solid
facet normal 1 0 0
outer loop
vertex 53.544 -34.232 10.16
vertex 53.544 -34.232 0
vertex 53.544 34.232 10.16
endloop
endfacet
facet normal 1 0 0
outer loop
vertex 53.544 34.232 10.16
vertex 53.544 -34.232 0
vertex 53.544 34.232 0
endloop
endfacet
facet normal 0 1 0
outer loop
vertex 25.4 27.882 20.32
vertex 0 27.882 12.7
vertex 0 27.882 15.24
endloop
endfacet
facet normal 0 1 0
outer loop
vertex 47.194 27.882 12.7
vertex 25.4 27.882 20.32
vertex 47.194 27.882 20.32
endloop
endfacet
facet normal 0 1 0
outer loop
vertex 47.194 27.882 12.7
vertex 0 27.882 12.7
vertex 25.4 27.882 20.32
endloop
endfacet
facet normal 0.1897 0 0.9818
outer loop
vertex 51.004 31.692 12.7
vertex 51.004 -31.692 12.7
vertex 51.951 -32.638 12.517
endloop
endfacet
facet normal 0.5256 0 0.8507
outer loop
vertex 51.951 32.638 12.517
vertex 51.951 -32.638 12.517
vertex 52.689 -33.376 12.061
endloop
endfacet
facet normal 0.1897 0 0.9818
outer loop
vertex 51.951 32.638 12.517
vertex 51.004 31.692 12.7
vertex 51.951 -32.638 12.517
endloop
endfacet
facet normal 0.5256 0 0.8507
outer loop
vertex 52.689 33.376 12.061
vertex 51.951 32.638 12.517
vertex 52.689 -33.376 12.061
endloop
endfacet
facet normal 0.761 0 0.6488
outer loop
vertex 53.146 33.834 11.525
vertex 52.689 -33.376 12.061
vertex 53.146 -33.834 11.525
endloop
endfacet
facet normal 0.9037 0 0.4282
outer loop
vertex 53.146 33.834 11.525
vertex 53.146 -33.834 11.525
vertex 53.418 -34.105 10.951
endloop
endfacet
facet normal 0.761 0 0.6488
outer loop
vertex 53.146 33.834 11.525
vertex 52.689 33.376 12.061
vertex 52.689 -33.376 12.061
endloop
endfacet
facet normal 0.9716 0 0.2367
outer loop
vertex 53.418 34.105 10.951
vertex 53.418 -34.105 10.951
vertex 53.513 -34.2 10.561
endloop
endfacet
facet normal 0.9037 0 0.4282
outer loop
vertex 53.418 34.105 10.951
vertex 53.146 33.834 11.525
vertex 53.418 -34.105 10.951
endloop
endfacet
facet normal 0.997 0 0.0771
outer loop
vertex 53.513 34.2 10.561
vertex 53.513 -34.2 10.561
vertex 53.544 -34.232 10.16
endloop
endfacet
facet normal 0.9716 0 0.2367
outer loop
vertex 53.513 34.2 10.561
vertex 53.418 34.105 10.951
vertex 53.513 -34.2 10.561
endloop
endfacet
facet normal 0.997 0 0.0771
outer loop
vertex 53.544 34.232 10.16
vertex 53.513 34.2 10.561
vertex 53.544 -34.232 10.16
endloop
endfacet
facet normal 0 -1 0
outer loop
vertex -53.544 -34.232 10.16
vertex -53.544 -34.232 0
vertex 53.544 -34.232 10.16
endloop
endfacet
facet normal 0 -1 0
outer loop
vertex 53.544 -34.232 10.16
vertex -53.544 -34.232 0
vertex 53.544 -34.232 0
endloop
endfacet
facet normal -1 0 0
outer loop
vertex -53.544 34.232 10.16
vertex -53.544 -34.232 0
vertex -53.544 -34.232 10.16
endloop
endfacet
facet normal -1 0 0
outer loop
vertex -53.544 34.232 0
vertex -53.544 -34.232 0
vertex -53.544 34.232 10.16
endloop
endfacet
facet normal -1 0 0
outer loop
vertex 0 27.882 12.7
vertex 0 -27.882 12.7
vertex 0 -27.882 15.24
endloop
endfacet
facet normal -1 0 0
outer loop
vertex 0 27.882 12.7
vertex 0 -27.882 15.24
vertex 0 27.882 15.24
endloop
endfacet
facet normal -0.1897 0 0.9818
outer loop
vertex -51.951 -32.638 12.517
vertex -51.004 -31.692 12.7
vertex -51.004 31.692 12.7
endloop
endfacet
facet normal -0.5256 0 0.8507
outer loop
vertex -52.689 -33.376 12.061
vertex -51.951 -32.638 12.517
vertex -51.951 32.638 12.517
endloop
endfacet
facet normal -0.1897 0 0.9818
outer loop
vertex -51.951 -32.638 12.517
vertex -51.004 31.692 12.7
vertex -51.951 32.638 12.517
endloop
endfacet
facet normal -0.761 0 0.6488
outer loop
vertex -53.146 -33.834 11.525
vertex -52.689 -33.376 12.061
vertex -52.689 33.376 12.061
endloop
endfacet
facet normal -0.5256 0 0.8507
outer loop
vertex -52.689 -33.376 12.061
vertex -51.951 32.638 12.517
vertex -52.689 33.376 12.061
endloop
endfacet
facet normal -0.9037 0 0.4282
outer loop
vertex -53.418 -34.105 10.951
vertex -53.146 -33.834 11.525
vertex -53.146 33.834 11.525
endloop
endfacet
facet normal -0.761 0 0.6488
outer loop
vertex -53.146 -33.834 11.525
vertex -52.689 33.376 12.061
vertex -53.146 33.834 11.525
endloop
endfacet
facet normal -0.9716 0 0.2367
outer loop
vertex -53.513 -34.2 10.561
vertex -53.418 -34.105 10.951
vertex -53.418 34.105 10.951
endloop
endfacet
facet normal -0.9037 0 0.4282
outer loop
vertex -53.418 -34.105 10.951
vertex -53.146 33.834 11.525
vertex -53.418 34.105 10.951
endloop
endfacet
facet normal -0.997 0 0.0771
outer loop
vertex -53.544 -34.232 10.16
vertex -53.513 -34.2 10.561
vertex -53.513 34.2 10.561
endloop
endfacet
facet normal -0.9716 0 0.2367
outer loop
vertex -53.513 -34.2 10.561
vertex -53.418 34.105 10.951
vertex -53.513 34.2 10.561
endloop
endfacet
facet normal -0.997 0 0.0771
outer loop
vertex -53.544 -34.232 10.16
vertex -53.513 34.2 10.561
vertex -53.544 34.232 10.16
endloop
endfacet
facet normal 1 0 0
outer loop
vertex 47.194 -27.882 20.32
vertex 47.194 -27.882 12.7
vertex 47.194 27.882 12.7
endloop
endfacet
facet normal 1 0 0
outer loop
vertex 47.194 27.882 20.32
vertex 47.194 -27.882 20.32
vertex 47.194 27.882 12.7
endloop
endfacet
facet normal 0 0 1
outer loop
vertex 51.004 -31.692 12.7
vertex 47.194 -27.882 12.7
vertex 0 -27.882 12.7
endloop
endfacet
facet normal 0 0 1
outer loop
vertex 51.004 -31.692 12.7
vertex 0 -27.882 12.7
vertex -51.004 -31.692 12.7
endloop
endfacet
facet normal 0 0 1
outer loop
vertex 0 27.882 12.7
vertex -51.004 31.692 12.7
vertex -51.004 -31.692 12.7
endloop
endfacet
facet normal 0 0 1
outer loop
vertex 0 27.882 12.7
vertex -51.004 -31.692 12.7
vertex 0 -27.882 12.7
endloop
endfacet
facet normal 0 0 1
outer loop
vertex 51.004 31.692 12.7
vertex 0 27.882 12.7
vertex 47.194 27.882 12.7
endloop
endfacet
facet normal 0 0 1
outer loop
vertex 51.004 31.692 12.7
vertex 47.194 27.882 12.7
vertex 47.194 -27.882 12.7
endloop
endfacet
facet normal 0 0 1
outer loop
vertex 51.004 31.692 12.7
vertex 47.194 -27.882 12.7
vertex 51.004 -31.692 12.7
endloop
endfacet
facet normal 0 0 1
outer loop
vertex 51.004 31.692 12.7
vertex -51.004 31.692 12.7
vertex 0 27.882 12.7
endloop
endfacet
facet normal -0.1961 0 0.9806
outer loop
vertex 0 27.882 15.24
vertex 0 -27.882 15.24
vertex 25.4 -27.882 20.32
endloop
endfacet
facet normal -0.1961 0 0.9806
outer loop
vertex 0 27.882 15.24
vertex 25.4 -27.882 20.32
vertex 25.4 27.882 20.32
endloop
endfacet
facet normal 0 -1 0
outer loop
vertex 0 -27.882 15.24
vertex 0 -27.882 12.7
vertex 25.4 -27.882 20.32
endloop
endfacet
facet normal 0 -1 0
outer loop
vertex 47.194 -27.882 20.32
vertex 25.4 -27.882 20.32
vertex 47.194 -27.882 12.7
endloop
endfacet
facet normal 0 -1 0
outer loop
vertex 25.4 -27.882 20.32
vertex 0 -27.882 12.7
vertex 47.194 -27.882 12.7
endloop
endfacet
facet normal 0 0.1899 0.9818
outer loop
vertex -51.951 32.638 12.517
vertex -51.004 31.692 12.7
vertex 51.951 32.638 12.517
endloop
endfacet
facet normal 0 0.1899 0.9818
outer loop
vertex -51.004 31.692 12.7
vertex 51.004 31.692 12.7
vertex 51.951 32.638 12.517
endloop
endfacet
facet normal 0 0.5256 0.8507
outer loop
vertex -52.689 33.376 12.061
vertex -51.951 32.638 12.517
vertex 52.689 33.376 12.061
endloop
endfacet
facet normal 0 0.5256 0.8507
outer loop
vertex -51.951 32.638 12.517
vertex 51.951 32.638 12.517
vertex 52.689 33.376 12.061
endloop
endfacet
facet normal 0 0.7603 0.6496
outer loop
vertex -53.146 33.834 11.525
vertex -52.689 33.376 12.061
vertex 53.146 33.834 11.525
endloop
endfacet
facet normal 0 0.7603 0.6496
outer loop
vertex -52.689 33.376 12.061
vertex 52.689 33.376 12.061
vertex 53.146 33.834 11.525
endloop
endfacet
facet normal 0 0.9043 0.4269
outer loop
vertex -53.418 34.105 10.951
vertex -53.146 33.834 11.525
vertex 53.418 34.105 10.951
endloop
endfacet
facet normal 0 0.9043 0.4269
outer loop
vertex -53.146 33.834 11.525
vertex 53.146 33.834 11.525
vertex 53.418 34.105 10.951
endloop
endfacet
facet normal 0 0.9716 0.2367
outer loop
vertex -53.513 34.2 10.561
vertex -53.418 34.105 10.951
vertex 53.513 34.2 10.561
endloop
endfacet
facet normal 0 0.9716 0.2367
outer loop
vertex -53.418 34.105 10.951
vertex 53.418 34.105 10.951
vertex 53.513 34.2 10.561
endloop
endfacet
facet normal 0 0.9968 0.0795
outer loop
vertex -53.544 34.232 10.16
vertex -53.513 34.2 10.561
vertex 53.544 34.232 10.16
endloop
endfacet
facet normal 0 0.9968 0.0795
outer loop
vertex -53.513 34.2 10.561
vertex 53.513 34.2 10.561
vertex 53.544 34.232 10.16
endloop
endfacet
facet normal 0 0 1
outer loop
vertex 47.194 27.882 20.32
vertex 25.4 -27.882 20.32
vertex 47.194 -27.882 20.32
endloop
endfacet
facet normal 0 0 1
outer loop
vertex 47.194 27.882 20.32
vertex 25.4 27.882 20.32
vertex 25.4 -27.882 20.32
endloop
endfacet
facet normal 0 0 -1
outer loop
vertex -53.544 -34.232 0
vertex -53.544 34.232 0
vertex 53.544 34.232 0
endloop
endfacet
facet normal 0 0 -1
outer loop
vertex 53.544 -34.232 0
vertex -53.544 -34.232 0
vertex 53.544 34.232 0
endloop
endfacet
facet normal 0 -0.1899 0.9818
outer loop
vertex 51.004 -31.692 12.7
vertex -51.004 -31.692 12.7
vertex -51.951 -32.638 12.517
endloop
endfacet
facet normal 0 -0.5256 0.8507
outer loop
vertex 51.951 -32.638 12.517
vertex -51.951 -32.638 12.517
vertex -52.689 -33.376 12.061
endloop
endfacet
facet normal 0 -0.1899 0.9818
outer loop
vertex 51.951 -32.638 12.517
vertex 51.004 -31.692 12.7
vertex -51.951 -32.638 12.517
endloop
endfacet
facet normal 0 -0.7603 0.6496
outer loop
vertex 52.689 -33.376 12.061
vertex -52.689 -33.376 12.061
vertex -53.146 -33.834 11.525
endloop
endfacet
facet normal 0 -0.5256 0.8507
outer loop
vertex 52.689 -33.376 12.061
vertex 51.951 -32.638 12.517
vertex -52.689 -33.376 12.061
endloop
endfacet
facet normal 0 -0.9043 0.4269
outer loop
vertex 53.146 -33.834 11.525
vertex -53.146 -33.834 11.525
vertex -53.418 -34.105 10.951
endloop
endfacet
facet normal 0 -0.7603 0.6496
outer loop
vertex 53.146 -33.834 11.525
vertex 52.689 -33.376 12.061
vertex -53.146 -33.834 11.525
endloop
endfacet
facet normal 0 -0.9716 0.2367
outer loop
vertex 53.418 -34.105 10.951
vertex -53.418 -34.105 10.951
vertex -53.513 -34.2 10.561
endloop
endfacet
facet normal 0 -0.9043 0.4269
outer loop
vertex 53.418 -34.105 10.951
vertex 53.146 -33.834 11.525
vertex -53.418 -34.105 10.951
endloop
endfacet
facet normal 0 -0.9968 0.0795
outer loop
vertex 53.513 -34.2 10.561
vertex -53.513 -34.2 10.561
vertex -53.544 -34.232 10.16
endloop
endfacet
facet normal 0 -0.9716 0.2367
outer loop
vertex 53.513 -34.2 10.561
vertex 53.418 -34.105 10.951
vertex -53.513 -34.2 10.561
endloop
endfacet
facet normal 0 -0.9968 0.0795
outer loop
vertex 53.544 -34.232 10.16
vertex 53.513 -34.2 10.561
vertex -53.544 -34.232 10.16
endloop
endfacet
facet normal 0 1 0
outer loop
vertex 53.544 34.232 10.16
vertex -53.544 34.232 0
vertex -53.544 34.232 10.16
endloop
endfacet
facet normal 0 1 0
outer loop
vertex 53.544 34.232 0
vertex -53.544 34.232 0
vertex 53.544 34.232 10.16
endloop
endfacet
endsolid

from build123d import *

# Parameters (mm, degrees)
F0_W     = 107.0887371898
F0_H     = 68.4632211924
F2_DEPTH = 12.7
F1_W     = 47.1943685949
F1_H     = 55.7632211924
F3_DEPTH = 20.32
F4_SIZE2 = 5.08
F4_SIZE  = 25.4
F5_R     = 2.54


with BuildPart() as f2:
    # F0 (on Top) → F2 (new body)
    with BuildSketch(Plane.XY):
        Rectangle(F0_W, F0_H)
    extrude(amount=F2_DEPTH)

    # F1 (on Top) → F3 (join)
    with BuildSketch(Plane.XY):
        with Locations((23.5971842974, 0)):
            Rectangle(F1_W, F1_H)
    extrude(amount=F3_DEPTH)

    # F4
    f4_edges = [f2.edges().sort_by_distance(p)[0] for p in [
        (0, 0, 20.32),
    ]]
    f4_side = f2.faces().sort_by_distance((23.597184, 0, 20.32))[0]
    chamfer(f4_edges, length=F4_SIZE, length2=F4_SIZE2, reference=f4_side)

    # F5
    f5_edges = [f2.edges().sort_by_distance(p)[0] for p in [
        (0, 34.231611, 12.7),
        (53.544369, 0, 12.7),
        (0, -34.231611, 12.7),
        (-53.544369, 0, 12.7),
    ]]
    fillet(f5_edges, radius=F5_R)


solid = f2.part
